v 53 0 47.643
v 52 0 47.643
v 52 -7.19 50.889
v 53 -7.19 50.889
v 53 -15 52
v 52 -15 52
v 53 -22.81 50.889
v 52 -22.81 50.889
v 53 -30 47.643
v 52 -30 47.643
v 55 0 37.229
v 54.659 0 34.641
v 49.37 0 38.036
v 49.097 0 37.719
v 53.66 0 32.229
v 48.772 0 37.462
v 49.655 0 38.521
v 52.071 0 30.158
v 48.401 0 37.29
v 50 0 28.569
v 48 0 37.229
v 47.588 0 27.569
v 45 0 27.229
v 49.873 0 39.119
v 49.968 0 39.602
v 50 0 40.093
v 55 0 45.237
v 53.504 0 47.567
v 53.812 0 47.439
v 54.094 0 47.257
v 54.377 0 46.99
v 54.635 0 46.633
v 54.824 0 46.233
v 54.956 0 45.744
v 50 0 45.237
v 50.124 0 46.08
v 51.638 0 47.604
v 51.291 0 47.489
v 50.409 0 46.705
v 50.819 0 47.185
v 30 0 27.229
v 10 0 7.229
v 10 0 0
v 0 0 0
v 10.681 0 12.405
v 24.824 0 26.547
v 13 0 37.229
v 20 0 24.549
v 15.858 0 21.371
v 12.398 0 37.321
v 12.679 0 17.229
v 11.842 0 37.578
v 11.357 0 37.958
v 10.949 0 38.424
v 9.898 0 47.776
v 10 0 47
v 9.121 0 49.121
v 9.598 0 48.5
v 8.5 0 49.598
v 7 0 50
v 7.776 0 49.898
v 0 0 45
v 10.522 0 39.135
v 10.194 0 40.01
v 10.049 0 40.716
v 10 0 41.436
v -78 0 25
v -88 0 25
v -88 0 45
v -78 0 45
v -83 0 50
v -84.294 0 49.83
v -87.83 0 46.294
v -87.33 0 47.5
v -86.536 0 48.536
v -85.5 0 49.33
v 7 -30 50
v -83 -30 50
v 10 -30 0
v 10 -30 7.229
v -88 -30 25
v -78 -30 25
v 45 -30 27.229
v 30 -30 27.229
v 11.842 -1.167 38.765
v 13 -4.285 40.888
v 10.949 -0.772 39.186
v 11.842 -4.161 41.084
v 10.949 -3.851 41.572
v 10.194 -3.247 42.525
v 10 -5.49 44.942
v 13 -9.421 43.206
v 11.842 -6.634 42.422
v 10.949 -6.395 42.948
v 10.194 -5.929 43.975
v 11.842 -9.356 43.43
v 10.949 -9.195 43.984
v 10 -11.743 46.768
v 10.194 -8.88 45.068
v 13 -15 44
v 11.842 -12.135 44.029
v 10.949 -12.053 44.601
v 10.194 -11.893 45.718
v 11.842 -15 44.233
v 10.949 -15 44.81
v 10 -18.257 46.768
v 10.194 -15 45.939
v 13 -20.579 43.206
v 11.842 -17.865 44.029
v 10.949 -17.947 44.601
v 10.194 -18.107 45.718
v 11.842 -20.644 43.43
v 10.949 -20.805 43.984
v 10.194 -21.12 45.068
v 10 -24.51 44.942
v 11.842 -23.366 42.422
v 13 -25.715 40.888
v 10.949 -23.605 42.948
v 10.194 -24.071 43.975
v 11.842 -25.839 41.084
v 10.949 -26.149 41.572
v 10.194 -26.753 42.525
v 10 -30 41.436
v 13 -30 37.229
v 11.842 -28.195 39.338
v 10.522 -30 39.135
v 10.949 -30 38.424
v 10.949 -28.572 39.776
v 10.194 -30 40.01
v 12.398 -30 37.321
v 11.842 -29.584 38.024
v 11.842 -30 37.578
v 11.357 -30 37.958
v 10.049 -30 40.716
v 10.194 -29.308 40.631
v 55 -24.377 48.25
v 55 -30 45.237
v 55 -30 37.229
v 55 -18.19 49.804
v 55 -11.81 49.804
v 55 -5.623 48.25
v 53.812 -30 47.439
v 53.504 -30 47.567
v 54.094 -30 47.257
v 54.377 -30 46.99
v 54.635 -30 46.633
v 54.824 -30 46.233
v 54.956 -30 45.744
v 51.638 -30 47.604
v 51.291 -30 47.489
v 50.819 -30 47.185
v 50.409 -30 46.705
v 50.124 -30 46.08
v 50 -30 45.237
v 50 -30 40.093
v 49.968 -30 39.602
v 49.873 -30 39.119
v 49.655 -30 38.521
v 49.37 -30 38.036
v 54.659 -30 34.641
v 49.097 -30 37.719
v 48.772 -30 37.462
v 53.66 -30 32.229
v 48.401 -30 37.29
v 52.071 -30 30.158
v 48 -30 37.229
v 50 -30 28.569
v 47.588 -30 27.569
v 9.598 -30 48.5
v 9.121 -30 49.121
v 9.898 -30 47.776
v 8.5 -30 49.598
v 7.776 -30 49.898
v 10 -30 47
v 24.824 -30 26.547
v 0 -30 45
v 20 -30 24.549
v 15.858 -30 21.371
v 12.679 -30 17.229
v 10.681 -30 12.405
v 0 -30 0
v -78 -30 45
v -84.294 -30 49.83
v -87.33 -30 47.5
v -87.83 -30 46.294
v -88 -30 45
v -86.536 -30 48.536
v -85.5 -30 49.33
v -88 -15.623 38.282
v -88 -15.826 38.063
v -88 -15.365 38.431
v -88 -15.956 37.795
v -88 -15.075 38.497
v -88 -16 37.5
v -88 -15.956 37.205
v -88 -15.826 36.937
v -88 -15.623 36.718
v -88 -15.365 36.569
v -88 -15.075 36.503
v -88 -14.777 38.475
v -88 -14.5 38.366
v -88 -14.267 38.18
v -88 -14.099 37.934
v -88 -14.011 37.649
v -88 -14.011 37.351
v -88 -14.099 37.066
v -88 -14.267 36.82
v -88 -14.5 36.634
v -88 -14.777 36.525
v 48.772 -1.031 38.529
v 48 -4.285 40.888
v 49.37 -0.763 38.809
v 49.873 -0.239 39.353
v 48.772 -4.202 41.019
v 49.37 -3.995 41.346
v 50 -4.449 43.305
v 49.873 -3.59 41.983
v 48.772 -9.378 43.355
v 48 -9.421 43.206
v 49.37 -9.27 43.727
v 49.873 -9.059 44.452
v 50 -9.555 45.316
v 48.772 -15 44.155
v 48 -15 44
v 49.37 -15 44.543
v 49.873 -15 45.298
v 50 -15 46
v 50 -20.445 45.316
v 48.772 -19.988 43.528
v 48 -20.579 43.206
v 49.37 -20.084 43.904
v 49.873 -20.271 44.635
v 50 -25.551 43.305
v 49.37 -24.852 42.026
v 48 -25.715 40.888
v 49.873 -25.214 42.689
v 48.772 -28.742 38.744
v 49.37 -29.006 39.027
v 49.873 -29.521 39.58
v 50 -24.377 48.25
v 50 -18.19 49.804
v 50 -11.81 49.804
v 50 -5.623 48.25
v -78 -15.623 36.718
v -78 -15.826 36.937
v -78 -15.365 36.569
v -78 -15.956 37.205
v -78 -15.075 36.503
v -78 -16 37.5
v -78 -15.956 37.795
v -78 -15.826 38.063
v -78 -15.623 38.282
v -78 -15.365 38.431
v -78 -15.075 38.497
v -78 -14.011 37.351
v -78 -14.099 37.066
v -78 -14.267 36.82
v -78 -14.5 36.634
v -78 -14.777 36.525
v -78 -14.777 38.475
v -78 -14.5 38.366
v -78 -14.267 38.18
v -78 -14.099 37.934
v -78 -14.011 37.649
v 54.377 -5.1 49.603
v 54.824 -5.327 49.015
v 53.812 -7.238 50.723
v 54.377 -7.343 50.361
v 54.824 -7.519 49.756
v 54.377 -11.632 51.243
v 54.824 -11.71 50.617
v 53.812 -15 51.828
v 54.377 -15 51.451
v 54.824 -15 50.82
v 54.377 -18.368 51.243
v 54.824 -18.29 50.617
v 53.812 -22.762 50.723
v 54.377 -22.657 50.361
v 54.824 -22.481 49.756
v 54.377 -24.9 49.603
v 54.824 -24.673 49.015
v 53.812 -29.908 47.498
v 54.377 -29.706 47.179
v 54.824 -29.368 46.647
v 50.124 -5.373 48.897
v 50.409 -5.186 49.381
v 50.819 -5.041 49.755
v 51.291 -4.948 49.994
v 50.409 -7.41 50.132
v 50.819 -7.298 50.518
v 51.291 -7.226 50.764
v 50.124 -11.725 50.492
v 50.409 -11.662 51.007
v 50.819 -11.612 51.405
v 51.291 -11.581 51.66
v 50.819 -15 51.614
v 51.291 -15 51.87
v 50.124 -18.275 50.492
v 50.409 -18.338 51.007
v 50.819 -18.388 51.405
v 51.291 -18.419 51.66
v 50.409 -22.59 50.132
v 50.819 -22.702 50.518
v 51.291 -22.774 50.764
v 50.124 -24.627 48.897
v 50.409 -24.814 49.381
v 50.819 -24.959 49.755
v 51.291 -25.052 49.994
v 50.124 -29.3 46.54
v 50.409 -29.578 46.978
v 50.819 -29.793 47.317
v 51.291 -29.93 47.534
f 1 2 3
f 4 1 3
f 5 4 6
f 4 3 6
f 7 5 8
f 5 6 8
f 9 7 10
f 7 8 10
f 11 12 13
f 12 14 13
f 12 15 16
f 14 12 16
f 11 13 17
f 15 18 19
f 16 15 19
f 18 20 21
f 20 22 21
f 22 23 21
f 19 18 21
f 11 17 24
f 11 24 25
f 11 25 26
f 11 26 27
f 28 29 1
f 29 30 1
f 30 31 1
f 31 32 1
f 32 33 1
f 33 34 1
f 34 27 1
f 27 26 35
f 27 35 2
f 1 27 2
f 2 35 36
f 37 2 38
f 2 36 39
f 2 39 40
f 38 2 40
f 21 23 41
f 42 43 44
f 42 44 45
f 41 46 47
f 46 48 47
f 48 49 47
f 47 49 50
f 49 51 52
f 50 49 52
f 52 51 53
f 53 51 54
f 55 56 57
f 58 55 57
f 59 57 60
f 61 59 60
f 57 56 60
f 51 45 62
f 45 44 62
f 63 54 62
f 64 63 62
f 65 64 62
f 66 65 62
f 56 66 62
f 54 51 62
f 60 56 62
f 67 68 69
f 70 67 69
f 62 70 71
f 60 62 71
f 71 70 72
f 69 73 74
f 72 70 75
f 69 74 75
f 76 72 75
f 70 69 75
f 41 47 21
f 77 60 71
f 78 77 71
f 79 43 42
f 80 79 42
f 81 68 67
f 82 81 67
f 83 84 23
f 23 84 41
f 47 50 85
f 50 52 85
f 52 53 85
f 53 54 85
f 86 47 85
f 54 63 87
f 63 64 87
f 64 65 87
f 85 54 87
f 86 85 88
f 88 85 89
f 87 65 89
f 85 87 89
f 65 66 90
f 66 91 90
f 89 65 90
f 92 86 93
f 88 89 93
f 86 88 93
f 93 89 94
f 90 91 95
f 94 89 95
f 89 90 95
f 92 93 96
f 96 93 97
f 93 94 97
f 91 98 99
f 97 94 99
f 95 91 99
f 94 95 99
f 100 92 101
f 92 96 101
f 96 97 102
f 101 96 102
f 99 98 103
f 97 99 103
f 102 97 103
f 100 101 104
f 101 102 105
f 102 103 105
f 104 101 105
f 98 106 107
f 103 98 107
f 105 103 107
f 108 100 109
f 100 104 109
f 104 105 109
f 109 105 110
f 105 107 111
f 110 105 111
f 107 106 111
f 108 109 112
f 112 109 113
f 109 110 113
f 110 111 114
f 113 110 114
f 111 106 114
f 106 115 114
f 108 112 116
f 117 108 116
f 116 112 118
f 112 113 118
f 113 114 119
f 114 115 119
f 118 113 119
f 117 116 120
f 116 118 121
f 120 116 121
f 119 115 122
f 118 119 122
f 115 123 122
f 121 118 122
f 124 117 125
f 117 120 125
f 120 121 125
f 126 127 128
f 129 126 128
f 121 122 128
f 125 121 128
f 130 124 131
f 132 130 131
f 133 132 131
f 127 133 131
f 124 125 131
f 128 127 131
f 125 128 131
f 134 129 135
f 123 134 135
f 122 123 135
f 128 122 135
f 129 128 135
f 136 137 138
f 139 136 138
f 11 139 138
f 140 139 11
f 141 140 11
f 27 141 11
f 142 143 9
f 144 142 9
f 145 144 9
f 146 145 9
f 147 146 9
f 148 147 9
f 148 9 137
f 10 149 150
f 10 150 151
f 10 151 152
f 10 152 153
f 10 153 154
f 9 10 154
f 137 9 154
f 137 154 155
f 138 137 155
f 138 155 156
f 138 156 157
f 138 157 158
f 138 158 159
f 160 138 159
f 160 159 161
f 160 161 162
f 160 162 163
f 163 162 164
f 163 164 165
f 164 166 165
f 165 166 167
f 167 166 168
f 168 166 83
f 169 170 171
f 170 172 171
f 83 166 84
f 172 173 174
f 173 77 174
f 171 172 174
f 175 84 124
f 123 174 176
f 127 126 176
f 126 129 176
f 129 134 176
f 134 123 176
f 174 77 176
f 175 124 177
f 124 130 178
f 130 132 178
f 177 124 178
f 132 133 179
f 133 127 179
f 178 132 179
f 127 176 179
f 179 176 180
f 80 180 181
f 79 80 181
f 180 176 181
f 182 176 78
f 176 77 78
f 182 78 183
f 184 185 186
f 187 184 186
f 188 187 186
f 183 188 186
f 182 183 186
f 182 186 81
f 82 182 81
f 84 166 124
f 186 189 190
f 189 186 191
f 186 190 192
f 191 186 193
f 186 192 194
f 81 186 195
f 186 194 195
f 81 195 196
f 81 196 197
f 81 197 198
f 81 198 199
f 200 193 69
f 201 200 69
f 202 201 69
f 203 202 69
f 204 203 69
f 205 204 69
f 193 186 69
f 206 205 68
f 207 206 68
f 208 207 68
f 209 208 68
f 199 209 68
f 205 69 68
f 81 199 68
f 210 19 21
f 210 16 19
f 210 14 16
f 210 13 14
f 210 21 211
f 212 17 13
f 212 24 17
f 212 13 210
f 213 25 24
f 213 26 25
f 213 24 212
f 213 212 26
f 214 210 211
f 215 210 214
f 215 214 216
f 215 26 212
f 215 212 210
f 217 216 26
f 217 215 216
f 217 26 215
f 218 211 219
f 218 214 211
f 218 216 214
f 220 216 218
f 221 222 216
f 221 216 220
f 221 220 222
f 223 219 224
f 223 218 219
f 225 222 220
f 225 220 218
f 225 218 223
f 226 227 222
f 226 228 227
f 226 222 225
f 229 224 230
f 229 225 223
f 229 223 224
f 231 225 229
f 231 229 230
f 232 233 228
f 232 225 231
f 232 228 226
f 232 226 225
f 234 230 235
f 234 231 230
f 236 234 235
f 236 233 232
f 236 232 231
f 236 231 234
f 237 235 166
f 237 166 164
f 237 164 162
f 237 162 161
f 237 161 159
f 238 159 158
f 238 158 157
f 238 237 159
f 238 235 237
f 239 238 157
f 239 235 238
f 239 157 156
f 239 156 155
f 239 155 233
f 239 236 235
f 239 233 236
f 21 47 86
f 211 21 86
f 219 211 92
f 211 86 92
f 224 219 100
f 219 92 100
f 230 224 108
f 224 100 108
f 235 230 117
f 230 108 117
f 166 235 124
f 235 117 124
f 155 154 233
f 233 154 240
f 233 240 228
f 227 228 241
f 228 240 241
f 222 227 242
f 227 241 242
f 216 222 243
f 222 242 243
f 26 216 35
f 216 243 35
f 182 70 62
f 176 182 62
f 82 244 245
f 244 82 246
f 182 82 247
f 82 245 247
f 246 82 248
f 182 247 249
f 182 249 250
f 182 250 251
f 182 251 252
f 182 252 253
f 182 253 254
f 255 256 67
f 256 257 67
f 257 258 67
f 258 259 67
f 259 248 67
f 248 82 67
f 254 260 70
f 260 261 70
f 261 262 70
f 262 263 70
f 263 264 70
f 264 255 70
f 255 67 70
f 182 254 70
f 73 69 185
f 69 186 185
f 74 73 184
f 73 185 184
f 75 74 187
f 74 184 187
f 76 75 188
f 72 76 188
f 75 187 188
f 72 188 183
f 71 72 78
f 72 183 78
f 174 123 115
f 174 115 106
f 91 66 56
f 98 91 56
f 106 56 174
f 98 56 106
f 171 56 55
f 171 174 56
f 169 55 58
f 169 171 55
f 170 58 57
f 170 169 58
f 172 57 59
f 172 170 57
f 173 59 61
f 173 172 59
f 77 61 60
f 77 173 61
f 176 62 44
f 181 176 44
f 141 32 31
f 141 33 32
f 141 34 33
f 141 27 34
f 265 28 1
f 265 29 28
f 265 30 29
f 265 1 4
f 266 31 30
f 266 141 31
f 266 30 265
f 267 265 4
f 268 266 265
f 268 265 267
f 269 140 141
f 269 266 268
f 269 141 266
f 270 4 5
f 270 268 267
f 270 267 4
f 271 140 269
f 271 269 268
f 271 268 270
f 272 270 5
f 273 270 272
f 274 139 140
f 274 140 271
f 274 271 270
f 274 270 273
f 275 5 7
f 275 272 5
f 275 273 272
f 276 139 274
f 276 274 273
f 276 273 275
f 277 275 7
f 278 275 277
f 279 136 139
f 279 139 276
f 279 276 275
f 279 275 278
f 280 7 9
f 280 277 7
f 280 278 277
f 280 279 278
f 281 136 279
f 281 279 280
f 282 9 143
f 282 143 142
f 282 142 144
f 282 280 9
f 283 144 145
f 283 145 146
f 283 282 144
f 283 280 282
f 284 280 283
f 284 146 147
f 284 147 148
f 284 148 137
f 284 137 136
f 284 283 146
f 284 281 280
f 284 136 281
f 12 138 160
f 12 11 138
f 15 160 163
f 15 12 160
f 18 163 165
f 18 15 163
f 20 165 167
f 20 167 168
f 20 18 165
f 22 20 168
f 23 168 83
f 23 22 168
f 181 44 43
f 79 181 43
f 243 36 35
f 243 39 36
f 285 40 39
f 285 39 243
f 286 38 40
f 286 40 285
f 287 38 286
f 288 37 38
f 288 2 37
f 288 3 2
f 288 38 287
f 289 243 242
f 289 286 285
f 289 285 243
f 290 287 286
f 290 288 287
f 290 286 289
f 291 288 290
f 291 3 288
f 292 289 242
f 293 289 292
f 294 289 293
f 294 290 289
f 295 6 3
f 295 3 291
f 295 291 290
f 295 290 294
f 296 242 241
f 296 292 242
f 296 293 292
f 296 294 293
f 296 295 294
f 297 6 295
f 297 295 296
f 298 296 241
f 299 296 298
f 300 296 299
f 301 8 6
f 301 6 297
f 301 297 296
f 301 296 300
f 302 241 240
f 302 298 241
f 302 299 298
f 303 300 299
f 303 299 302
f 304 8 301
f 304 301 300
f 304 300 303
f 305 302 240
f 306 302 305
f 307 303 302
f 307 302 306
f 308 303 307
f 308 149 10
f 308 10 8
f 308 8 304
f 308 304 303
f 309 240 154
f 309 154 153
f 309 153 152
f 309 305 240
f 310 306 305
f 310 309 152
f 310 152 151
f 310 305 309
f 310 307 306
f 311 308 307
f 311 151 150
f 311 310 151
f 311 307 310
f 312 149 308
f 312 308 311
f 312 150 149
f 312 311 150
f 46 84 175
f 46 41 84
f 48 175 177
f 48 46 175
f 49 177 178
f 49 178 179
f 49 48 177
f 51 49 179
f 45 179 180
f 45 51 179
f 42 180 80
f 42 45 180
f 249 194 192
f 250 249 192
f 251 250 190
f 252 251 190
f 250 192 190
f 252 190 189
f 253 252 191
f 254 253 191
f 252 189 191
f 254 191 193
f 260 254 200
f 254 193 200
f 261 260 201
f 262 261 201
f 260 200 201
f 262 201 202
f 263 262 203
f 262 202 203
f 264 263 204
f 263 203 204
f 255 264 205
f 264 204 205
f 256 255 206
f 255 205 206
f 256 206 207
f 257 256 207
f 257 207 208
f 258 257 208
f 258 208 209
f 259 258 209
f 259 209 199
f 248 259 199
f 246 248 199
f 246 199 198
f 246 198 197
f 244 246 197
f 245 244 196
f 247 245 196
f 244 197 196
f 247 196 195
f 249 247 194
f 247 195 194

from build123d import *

# Parameters (mm, degrees)
F1_DEPTH = 30
F2_R     = 1
F3_DEPTH = 10
F5_DEPTH = 40
F7_DEPTH = 5
F8_R     = 20
F9_R     = 2.99999
F10_R    = 2
F11_R    = 10
F12_R    = 5


# Not quite as in the source:
# - a fillet or chamfer is up to 0.001 mm smaller than in the source, because OpenCascade refuses the exact size


with BuildPart() as f1:
    # F0 (on Front) → F1 (new body)
    with BuildSketch(Plane.XZ):
        Polygon((0, 45), (0, 0), (10, 0), (10, 50), (-88, 50), (-88, 25), (-78, 25), (-78, 45), align=None)
    extrude(amount=F1_DEPTH)

    # F2 (on face) → F3 (cut, through all)
    with BuildSketch(Plane(origin=(-88, 0, 0), x_dir=(0, -1, 0), z_dir=(-1, 0, 0))):
        with Locations((15, 37.5)):
            Circle(F2_R)
    extrude(amount=-F3_DEPTH, mode=Mode.SUBTRACT)

    # F4 (on face) → F5 (join)
    with BuildSketch(Plane.YZ.offset(10)):
        with BuildLine():
            Line((0, 27.2287565553), (0, 37.2287565553))
            ThreePointArc((0, 37.2287565553), (-15, 44), (-30, 37.2287565553))
            Line((-30, 37.2287565553), (-30, 27.2287565553))
            Line((-30, 27.2287565553), (0, 27.2287565553))
        make_face()
    extrude(amount=F5_DEPTH)

    # F6 (on face) → F7 (join)
    with BuildSketch(Plane.YZ.offset(50)):
        with BuildLine():
            Line((0, 37.2287565553), (0, 47.6431808351))
            ThreePointArc((0, 47.6431808351), (-15, 52), (-30, 47.6431808351))
            Line((-30, 47.6431808351), (-30, 37.2287565553))
            ThreePointArc((-30, 37.2287565553), (-15, 44), (0, 37.2287565553))
        make_face()
        with BuildLine():
            Line((0, 27.2287565553), (0, 37.2287565553))
            ThreePointArc((0, 37.2287565553), (-15, 44), (-30, 37.2287565553))
            Line((-30, 37.2287565553), (-30, 27.2287565553))
            Line((-30, 27.2287565553), (0, 27.2287565553))
        make_face()
    extrude(amount=F7_DEPTH)

    # F8
    f8_edges = [f1.edges().sort_by_distance(p)[0] for p in [
        (10, -15, 27.228757),
    ]]
    fillet(f8_edges, radius=F8_R)

    # F9 (radius 3 in the source; OpenCascade refuses exactly that, so slightly less here)
    f9_edges = [f1.edges().sort_by_distance(p)[0] for p in [
        (10, -15, 44),
        (10, -15, 50),
    ]]
    fillet(f9_edges, radius=F9_R)

    # F10
    f10_edges = [f1.edges().sort_by_distance(p)[0] for p in [
        (50, -15, 44),
        (50, -15, 52),
        (55, -15, 52),
    ]]
    fillet(f10_edges, radius=F10_R)

    # F11
    f11_edges = [f1.edges().sort_by_distance(p)[0] for p in [
        (55, -15, 27.228757),
    ]]
    fillet(f11_edges, radius=F11_R)

    # F12
    f12_edges = [f1.edges().sort_by_distance(p)[0] for p in [
        (-88, -15, 50),
    ]]
    fillet(f12_edges, radius=F12_R)


solid = f1.part
